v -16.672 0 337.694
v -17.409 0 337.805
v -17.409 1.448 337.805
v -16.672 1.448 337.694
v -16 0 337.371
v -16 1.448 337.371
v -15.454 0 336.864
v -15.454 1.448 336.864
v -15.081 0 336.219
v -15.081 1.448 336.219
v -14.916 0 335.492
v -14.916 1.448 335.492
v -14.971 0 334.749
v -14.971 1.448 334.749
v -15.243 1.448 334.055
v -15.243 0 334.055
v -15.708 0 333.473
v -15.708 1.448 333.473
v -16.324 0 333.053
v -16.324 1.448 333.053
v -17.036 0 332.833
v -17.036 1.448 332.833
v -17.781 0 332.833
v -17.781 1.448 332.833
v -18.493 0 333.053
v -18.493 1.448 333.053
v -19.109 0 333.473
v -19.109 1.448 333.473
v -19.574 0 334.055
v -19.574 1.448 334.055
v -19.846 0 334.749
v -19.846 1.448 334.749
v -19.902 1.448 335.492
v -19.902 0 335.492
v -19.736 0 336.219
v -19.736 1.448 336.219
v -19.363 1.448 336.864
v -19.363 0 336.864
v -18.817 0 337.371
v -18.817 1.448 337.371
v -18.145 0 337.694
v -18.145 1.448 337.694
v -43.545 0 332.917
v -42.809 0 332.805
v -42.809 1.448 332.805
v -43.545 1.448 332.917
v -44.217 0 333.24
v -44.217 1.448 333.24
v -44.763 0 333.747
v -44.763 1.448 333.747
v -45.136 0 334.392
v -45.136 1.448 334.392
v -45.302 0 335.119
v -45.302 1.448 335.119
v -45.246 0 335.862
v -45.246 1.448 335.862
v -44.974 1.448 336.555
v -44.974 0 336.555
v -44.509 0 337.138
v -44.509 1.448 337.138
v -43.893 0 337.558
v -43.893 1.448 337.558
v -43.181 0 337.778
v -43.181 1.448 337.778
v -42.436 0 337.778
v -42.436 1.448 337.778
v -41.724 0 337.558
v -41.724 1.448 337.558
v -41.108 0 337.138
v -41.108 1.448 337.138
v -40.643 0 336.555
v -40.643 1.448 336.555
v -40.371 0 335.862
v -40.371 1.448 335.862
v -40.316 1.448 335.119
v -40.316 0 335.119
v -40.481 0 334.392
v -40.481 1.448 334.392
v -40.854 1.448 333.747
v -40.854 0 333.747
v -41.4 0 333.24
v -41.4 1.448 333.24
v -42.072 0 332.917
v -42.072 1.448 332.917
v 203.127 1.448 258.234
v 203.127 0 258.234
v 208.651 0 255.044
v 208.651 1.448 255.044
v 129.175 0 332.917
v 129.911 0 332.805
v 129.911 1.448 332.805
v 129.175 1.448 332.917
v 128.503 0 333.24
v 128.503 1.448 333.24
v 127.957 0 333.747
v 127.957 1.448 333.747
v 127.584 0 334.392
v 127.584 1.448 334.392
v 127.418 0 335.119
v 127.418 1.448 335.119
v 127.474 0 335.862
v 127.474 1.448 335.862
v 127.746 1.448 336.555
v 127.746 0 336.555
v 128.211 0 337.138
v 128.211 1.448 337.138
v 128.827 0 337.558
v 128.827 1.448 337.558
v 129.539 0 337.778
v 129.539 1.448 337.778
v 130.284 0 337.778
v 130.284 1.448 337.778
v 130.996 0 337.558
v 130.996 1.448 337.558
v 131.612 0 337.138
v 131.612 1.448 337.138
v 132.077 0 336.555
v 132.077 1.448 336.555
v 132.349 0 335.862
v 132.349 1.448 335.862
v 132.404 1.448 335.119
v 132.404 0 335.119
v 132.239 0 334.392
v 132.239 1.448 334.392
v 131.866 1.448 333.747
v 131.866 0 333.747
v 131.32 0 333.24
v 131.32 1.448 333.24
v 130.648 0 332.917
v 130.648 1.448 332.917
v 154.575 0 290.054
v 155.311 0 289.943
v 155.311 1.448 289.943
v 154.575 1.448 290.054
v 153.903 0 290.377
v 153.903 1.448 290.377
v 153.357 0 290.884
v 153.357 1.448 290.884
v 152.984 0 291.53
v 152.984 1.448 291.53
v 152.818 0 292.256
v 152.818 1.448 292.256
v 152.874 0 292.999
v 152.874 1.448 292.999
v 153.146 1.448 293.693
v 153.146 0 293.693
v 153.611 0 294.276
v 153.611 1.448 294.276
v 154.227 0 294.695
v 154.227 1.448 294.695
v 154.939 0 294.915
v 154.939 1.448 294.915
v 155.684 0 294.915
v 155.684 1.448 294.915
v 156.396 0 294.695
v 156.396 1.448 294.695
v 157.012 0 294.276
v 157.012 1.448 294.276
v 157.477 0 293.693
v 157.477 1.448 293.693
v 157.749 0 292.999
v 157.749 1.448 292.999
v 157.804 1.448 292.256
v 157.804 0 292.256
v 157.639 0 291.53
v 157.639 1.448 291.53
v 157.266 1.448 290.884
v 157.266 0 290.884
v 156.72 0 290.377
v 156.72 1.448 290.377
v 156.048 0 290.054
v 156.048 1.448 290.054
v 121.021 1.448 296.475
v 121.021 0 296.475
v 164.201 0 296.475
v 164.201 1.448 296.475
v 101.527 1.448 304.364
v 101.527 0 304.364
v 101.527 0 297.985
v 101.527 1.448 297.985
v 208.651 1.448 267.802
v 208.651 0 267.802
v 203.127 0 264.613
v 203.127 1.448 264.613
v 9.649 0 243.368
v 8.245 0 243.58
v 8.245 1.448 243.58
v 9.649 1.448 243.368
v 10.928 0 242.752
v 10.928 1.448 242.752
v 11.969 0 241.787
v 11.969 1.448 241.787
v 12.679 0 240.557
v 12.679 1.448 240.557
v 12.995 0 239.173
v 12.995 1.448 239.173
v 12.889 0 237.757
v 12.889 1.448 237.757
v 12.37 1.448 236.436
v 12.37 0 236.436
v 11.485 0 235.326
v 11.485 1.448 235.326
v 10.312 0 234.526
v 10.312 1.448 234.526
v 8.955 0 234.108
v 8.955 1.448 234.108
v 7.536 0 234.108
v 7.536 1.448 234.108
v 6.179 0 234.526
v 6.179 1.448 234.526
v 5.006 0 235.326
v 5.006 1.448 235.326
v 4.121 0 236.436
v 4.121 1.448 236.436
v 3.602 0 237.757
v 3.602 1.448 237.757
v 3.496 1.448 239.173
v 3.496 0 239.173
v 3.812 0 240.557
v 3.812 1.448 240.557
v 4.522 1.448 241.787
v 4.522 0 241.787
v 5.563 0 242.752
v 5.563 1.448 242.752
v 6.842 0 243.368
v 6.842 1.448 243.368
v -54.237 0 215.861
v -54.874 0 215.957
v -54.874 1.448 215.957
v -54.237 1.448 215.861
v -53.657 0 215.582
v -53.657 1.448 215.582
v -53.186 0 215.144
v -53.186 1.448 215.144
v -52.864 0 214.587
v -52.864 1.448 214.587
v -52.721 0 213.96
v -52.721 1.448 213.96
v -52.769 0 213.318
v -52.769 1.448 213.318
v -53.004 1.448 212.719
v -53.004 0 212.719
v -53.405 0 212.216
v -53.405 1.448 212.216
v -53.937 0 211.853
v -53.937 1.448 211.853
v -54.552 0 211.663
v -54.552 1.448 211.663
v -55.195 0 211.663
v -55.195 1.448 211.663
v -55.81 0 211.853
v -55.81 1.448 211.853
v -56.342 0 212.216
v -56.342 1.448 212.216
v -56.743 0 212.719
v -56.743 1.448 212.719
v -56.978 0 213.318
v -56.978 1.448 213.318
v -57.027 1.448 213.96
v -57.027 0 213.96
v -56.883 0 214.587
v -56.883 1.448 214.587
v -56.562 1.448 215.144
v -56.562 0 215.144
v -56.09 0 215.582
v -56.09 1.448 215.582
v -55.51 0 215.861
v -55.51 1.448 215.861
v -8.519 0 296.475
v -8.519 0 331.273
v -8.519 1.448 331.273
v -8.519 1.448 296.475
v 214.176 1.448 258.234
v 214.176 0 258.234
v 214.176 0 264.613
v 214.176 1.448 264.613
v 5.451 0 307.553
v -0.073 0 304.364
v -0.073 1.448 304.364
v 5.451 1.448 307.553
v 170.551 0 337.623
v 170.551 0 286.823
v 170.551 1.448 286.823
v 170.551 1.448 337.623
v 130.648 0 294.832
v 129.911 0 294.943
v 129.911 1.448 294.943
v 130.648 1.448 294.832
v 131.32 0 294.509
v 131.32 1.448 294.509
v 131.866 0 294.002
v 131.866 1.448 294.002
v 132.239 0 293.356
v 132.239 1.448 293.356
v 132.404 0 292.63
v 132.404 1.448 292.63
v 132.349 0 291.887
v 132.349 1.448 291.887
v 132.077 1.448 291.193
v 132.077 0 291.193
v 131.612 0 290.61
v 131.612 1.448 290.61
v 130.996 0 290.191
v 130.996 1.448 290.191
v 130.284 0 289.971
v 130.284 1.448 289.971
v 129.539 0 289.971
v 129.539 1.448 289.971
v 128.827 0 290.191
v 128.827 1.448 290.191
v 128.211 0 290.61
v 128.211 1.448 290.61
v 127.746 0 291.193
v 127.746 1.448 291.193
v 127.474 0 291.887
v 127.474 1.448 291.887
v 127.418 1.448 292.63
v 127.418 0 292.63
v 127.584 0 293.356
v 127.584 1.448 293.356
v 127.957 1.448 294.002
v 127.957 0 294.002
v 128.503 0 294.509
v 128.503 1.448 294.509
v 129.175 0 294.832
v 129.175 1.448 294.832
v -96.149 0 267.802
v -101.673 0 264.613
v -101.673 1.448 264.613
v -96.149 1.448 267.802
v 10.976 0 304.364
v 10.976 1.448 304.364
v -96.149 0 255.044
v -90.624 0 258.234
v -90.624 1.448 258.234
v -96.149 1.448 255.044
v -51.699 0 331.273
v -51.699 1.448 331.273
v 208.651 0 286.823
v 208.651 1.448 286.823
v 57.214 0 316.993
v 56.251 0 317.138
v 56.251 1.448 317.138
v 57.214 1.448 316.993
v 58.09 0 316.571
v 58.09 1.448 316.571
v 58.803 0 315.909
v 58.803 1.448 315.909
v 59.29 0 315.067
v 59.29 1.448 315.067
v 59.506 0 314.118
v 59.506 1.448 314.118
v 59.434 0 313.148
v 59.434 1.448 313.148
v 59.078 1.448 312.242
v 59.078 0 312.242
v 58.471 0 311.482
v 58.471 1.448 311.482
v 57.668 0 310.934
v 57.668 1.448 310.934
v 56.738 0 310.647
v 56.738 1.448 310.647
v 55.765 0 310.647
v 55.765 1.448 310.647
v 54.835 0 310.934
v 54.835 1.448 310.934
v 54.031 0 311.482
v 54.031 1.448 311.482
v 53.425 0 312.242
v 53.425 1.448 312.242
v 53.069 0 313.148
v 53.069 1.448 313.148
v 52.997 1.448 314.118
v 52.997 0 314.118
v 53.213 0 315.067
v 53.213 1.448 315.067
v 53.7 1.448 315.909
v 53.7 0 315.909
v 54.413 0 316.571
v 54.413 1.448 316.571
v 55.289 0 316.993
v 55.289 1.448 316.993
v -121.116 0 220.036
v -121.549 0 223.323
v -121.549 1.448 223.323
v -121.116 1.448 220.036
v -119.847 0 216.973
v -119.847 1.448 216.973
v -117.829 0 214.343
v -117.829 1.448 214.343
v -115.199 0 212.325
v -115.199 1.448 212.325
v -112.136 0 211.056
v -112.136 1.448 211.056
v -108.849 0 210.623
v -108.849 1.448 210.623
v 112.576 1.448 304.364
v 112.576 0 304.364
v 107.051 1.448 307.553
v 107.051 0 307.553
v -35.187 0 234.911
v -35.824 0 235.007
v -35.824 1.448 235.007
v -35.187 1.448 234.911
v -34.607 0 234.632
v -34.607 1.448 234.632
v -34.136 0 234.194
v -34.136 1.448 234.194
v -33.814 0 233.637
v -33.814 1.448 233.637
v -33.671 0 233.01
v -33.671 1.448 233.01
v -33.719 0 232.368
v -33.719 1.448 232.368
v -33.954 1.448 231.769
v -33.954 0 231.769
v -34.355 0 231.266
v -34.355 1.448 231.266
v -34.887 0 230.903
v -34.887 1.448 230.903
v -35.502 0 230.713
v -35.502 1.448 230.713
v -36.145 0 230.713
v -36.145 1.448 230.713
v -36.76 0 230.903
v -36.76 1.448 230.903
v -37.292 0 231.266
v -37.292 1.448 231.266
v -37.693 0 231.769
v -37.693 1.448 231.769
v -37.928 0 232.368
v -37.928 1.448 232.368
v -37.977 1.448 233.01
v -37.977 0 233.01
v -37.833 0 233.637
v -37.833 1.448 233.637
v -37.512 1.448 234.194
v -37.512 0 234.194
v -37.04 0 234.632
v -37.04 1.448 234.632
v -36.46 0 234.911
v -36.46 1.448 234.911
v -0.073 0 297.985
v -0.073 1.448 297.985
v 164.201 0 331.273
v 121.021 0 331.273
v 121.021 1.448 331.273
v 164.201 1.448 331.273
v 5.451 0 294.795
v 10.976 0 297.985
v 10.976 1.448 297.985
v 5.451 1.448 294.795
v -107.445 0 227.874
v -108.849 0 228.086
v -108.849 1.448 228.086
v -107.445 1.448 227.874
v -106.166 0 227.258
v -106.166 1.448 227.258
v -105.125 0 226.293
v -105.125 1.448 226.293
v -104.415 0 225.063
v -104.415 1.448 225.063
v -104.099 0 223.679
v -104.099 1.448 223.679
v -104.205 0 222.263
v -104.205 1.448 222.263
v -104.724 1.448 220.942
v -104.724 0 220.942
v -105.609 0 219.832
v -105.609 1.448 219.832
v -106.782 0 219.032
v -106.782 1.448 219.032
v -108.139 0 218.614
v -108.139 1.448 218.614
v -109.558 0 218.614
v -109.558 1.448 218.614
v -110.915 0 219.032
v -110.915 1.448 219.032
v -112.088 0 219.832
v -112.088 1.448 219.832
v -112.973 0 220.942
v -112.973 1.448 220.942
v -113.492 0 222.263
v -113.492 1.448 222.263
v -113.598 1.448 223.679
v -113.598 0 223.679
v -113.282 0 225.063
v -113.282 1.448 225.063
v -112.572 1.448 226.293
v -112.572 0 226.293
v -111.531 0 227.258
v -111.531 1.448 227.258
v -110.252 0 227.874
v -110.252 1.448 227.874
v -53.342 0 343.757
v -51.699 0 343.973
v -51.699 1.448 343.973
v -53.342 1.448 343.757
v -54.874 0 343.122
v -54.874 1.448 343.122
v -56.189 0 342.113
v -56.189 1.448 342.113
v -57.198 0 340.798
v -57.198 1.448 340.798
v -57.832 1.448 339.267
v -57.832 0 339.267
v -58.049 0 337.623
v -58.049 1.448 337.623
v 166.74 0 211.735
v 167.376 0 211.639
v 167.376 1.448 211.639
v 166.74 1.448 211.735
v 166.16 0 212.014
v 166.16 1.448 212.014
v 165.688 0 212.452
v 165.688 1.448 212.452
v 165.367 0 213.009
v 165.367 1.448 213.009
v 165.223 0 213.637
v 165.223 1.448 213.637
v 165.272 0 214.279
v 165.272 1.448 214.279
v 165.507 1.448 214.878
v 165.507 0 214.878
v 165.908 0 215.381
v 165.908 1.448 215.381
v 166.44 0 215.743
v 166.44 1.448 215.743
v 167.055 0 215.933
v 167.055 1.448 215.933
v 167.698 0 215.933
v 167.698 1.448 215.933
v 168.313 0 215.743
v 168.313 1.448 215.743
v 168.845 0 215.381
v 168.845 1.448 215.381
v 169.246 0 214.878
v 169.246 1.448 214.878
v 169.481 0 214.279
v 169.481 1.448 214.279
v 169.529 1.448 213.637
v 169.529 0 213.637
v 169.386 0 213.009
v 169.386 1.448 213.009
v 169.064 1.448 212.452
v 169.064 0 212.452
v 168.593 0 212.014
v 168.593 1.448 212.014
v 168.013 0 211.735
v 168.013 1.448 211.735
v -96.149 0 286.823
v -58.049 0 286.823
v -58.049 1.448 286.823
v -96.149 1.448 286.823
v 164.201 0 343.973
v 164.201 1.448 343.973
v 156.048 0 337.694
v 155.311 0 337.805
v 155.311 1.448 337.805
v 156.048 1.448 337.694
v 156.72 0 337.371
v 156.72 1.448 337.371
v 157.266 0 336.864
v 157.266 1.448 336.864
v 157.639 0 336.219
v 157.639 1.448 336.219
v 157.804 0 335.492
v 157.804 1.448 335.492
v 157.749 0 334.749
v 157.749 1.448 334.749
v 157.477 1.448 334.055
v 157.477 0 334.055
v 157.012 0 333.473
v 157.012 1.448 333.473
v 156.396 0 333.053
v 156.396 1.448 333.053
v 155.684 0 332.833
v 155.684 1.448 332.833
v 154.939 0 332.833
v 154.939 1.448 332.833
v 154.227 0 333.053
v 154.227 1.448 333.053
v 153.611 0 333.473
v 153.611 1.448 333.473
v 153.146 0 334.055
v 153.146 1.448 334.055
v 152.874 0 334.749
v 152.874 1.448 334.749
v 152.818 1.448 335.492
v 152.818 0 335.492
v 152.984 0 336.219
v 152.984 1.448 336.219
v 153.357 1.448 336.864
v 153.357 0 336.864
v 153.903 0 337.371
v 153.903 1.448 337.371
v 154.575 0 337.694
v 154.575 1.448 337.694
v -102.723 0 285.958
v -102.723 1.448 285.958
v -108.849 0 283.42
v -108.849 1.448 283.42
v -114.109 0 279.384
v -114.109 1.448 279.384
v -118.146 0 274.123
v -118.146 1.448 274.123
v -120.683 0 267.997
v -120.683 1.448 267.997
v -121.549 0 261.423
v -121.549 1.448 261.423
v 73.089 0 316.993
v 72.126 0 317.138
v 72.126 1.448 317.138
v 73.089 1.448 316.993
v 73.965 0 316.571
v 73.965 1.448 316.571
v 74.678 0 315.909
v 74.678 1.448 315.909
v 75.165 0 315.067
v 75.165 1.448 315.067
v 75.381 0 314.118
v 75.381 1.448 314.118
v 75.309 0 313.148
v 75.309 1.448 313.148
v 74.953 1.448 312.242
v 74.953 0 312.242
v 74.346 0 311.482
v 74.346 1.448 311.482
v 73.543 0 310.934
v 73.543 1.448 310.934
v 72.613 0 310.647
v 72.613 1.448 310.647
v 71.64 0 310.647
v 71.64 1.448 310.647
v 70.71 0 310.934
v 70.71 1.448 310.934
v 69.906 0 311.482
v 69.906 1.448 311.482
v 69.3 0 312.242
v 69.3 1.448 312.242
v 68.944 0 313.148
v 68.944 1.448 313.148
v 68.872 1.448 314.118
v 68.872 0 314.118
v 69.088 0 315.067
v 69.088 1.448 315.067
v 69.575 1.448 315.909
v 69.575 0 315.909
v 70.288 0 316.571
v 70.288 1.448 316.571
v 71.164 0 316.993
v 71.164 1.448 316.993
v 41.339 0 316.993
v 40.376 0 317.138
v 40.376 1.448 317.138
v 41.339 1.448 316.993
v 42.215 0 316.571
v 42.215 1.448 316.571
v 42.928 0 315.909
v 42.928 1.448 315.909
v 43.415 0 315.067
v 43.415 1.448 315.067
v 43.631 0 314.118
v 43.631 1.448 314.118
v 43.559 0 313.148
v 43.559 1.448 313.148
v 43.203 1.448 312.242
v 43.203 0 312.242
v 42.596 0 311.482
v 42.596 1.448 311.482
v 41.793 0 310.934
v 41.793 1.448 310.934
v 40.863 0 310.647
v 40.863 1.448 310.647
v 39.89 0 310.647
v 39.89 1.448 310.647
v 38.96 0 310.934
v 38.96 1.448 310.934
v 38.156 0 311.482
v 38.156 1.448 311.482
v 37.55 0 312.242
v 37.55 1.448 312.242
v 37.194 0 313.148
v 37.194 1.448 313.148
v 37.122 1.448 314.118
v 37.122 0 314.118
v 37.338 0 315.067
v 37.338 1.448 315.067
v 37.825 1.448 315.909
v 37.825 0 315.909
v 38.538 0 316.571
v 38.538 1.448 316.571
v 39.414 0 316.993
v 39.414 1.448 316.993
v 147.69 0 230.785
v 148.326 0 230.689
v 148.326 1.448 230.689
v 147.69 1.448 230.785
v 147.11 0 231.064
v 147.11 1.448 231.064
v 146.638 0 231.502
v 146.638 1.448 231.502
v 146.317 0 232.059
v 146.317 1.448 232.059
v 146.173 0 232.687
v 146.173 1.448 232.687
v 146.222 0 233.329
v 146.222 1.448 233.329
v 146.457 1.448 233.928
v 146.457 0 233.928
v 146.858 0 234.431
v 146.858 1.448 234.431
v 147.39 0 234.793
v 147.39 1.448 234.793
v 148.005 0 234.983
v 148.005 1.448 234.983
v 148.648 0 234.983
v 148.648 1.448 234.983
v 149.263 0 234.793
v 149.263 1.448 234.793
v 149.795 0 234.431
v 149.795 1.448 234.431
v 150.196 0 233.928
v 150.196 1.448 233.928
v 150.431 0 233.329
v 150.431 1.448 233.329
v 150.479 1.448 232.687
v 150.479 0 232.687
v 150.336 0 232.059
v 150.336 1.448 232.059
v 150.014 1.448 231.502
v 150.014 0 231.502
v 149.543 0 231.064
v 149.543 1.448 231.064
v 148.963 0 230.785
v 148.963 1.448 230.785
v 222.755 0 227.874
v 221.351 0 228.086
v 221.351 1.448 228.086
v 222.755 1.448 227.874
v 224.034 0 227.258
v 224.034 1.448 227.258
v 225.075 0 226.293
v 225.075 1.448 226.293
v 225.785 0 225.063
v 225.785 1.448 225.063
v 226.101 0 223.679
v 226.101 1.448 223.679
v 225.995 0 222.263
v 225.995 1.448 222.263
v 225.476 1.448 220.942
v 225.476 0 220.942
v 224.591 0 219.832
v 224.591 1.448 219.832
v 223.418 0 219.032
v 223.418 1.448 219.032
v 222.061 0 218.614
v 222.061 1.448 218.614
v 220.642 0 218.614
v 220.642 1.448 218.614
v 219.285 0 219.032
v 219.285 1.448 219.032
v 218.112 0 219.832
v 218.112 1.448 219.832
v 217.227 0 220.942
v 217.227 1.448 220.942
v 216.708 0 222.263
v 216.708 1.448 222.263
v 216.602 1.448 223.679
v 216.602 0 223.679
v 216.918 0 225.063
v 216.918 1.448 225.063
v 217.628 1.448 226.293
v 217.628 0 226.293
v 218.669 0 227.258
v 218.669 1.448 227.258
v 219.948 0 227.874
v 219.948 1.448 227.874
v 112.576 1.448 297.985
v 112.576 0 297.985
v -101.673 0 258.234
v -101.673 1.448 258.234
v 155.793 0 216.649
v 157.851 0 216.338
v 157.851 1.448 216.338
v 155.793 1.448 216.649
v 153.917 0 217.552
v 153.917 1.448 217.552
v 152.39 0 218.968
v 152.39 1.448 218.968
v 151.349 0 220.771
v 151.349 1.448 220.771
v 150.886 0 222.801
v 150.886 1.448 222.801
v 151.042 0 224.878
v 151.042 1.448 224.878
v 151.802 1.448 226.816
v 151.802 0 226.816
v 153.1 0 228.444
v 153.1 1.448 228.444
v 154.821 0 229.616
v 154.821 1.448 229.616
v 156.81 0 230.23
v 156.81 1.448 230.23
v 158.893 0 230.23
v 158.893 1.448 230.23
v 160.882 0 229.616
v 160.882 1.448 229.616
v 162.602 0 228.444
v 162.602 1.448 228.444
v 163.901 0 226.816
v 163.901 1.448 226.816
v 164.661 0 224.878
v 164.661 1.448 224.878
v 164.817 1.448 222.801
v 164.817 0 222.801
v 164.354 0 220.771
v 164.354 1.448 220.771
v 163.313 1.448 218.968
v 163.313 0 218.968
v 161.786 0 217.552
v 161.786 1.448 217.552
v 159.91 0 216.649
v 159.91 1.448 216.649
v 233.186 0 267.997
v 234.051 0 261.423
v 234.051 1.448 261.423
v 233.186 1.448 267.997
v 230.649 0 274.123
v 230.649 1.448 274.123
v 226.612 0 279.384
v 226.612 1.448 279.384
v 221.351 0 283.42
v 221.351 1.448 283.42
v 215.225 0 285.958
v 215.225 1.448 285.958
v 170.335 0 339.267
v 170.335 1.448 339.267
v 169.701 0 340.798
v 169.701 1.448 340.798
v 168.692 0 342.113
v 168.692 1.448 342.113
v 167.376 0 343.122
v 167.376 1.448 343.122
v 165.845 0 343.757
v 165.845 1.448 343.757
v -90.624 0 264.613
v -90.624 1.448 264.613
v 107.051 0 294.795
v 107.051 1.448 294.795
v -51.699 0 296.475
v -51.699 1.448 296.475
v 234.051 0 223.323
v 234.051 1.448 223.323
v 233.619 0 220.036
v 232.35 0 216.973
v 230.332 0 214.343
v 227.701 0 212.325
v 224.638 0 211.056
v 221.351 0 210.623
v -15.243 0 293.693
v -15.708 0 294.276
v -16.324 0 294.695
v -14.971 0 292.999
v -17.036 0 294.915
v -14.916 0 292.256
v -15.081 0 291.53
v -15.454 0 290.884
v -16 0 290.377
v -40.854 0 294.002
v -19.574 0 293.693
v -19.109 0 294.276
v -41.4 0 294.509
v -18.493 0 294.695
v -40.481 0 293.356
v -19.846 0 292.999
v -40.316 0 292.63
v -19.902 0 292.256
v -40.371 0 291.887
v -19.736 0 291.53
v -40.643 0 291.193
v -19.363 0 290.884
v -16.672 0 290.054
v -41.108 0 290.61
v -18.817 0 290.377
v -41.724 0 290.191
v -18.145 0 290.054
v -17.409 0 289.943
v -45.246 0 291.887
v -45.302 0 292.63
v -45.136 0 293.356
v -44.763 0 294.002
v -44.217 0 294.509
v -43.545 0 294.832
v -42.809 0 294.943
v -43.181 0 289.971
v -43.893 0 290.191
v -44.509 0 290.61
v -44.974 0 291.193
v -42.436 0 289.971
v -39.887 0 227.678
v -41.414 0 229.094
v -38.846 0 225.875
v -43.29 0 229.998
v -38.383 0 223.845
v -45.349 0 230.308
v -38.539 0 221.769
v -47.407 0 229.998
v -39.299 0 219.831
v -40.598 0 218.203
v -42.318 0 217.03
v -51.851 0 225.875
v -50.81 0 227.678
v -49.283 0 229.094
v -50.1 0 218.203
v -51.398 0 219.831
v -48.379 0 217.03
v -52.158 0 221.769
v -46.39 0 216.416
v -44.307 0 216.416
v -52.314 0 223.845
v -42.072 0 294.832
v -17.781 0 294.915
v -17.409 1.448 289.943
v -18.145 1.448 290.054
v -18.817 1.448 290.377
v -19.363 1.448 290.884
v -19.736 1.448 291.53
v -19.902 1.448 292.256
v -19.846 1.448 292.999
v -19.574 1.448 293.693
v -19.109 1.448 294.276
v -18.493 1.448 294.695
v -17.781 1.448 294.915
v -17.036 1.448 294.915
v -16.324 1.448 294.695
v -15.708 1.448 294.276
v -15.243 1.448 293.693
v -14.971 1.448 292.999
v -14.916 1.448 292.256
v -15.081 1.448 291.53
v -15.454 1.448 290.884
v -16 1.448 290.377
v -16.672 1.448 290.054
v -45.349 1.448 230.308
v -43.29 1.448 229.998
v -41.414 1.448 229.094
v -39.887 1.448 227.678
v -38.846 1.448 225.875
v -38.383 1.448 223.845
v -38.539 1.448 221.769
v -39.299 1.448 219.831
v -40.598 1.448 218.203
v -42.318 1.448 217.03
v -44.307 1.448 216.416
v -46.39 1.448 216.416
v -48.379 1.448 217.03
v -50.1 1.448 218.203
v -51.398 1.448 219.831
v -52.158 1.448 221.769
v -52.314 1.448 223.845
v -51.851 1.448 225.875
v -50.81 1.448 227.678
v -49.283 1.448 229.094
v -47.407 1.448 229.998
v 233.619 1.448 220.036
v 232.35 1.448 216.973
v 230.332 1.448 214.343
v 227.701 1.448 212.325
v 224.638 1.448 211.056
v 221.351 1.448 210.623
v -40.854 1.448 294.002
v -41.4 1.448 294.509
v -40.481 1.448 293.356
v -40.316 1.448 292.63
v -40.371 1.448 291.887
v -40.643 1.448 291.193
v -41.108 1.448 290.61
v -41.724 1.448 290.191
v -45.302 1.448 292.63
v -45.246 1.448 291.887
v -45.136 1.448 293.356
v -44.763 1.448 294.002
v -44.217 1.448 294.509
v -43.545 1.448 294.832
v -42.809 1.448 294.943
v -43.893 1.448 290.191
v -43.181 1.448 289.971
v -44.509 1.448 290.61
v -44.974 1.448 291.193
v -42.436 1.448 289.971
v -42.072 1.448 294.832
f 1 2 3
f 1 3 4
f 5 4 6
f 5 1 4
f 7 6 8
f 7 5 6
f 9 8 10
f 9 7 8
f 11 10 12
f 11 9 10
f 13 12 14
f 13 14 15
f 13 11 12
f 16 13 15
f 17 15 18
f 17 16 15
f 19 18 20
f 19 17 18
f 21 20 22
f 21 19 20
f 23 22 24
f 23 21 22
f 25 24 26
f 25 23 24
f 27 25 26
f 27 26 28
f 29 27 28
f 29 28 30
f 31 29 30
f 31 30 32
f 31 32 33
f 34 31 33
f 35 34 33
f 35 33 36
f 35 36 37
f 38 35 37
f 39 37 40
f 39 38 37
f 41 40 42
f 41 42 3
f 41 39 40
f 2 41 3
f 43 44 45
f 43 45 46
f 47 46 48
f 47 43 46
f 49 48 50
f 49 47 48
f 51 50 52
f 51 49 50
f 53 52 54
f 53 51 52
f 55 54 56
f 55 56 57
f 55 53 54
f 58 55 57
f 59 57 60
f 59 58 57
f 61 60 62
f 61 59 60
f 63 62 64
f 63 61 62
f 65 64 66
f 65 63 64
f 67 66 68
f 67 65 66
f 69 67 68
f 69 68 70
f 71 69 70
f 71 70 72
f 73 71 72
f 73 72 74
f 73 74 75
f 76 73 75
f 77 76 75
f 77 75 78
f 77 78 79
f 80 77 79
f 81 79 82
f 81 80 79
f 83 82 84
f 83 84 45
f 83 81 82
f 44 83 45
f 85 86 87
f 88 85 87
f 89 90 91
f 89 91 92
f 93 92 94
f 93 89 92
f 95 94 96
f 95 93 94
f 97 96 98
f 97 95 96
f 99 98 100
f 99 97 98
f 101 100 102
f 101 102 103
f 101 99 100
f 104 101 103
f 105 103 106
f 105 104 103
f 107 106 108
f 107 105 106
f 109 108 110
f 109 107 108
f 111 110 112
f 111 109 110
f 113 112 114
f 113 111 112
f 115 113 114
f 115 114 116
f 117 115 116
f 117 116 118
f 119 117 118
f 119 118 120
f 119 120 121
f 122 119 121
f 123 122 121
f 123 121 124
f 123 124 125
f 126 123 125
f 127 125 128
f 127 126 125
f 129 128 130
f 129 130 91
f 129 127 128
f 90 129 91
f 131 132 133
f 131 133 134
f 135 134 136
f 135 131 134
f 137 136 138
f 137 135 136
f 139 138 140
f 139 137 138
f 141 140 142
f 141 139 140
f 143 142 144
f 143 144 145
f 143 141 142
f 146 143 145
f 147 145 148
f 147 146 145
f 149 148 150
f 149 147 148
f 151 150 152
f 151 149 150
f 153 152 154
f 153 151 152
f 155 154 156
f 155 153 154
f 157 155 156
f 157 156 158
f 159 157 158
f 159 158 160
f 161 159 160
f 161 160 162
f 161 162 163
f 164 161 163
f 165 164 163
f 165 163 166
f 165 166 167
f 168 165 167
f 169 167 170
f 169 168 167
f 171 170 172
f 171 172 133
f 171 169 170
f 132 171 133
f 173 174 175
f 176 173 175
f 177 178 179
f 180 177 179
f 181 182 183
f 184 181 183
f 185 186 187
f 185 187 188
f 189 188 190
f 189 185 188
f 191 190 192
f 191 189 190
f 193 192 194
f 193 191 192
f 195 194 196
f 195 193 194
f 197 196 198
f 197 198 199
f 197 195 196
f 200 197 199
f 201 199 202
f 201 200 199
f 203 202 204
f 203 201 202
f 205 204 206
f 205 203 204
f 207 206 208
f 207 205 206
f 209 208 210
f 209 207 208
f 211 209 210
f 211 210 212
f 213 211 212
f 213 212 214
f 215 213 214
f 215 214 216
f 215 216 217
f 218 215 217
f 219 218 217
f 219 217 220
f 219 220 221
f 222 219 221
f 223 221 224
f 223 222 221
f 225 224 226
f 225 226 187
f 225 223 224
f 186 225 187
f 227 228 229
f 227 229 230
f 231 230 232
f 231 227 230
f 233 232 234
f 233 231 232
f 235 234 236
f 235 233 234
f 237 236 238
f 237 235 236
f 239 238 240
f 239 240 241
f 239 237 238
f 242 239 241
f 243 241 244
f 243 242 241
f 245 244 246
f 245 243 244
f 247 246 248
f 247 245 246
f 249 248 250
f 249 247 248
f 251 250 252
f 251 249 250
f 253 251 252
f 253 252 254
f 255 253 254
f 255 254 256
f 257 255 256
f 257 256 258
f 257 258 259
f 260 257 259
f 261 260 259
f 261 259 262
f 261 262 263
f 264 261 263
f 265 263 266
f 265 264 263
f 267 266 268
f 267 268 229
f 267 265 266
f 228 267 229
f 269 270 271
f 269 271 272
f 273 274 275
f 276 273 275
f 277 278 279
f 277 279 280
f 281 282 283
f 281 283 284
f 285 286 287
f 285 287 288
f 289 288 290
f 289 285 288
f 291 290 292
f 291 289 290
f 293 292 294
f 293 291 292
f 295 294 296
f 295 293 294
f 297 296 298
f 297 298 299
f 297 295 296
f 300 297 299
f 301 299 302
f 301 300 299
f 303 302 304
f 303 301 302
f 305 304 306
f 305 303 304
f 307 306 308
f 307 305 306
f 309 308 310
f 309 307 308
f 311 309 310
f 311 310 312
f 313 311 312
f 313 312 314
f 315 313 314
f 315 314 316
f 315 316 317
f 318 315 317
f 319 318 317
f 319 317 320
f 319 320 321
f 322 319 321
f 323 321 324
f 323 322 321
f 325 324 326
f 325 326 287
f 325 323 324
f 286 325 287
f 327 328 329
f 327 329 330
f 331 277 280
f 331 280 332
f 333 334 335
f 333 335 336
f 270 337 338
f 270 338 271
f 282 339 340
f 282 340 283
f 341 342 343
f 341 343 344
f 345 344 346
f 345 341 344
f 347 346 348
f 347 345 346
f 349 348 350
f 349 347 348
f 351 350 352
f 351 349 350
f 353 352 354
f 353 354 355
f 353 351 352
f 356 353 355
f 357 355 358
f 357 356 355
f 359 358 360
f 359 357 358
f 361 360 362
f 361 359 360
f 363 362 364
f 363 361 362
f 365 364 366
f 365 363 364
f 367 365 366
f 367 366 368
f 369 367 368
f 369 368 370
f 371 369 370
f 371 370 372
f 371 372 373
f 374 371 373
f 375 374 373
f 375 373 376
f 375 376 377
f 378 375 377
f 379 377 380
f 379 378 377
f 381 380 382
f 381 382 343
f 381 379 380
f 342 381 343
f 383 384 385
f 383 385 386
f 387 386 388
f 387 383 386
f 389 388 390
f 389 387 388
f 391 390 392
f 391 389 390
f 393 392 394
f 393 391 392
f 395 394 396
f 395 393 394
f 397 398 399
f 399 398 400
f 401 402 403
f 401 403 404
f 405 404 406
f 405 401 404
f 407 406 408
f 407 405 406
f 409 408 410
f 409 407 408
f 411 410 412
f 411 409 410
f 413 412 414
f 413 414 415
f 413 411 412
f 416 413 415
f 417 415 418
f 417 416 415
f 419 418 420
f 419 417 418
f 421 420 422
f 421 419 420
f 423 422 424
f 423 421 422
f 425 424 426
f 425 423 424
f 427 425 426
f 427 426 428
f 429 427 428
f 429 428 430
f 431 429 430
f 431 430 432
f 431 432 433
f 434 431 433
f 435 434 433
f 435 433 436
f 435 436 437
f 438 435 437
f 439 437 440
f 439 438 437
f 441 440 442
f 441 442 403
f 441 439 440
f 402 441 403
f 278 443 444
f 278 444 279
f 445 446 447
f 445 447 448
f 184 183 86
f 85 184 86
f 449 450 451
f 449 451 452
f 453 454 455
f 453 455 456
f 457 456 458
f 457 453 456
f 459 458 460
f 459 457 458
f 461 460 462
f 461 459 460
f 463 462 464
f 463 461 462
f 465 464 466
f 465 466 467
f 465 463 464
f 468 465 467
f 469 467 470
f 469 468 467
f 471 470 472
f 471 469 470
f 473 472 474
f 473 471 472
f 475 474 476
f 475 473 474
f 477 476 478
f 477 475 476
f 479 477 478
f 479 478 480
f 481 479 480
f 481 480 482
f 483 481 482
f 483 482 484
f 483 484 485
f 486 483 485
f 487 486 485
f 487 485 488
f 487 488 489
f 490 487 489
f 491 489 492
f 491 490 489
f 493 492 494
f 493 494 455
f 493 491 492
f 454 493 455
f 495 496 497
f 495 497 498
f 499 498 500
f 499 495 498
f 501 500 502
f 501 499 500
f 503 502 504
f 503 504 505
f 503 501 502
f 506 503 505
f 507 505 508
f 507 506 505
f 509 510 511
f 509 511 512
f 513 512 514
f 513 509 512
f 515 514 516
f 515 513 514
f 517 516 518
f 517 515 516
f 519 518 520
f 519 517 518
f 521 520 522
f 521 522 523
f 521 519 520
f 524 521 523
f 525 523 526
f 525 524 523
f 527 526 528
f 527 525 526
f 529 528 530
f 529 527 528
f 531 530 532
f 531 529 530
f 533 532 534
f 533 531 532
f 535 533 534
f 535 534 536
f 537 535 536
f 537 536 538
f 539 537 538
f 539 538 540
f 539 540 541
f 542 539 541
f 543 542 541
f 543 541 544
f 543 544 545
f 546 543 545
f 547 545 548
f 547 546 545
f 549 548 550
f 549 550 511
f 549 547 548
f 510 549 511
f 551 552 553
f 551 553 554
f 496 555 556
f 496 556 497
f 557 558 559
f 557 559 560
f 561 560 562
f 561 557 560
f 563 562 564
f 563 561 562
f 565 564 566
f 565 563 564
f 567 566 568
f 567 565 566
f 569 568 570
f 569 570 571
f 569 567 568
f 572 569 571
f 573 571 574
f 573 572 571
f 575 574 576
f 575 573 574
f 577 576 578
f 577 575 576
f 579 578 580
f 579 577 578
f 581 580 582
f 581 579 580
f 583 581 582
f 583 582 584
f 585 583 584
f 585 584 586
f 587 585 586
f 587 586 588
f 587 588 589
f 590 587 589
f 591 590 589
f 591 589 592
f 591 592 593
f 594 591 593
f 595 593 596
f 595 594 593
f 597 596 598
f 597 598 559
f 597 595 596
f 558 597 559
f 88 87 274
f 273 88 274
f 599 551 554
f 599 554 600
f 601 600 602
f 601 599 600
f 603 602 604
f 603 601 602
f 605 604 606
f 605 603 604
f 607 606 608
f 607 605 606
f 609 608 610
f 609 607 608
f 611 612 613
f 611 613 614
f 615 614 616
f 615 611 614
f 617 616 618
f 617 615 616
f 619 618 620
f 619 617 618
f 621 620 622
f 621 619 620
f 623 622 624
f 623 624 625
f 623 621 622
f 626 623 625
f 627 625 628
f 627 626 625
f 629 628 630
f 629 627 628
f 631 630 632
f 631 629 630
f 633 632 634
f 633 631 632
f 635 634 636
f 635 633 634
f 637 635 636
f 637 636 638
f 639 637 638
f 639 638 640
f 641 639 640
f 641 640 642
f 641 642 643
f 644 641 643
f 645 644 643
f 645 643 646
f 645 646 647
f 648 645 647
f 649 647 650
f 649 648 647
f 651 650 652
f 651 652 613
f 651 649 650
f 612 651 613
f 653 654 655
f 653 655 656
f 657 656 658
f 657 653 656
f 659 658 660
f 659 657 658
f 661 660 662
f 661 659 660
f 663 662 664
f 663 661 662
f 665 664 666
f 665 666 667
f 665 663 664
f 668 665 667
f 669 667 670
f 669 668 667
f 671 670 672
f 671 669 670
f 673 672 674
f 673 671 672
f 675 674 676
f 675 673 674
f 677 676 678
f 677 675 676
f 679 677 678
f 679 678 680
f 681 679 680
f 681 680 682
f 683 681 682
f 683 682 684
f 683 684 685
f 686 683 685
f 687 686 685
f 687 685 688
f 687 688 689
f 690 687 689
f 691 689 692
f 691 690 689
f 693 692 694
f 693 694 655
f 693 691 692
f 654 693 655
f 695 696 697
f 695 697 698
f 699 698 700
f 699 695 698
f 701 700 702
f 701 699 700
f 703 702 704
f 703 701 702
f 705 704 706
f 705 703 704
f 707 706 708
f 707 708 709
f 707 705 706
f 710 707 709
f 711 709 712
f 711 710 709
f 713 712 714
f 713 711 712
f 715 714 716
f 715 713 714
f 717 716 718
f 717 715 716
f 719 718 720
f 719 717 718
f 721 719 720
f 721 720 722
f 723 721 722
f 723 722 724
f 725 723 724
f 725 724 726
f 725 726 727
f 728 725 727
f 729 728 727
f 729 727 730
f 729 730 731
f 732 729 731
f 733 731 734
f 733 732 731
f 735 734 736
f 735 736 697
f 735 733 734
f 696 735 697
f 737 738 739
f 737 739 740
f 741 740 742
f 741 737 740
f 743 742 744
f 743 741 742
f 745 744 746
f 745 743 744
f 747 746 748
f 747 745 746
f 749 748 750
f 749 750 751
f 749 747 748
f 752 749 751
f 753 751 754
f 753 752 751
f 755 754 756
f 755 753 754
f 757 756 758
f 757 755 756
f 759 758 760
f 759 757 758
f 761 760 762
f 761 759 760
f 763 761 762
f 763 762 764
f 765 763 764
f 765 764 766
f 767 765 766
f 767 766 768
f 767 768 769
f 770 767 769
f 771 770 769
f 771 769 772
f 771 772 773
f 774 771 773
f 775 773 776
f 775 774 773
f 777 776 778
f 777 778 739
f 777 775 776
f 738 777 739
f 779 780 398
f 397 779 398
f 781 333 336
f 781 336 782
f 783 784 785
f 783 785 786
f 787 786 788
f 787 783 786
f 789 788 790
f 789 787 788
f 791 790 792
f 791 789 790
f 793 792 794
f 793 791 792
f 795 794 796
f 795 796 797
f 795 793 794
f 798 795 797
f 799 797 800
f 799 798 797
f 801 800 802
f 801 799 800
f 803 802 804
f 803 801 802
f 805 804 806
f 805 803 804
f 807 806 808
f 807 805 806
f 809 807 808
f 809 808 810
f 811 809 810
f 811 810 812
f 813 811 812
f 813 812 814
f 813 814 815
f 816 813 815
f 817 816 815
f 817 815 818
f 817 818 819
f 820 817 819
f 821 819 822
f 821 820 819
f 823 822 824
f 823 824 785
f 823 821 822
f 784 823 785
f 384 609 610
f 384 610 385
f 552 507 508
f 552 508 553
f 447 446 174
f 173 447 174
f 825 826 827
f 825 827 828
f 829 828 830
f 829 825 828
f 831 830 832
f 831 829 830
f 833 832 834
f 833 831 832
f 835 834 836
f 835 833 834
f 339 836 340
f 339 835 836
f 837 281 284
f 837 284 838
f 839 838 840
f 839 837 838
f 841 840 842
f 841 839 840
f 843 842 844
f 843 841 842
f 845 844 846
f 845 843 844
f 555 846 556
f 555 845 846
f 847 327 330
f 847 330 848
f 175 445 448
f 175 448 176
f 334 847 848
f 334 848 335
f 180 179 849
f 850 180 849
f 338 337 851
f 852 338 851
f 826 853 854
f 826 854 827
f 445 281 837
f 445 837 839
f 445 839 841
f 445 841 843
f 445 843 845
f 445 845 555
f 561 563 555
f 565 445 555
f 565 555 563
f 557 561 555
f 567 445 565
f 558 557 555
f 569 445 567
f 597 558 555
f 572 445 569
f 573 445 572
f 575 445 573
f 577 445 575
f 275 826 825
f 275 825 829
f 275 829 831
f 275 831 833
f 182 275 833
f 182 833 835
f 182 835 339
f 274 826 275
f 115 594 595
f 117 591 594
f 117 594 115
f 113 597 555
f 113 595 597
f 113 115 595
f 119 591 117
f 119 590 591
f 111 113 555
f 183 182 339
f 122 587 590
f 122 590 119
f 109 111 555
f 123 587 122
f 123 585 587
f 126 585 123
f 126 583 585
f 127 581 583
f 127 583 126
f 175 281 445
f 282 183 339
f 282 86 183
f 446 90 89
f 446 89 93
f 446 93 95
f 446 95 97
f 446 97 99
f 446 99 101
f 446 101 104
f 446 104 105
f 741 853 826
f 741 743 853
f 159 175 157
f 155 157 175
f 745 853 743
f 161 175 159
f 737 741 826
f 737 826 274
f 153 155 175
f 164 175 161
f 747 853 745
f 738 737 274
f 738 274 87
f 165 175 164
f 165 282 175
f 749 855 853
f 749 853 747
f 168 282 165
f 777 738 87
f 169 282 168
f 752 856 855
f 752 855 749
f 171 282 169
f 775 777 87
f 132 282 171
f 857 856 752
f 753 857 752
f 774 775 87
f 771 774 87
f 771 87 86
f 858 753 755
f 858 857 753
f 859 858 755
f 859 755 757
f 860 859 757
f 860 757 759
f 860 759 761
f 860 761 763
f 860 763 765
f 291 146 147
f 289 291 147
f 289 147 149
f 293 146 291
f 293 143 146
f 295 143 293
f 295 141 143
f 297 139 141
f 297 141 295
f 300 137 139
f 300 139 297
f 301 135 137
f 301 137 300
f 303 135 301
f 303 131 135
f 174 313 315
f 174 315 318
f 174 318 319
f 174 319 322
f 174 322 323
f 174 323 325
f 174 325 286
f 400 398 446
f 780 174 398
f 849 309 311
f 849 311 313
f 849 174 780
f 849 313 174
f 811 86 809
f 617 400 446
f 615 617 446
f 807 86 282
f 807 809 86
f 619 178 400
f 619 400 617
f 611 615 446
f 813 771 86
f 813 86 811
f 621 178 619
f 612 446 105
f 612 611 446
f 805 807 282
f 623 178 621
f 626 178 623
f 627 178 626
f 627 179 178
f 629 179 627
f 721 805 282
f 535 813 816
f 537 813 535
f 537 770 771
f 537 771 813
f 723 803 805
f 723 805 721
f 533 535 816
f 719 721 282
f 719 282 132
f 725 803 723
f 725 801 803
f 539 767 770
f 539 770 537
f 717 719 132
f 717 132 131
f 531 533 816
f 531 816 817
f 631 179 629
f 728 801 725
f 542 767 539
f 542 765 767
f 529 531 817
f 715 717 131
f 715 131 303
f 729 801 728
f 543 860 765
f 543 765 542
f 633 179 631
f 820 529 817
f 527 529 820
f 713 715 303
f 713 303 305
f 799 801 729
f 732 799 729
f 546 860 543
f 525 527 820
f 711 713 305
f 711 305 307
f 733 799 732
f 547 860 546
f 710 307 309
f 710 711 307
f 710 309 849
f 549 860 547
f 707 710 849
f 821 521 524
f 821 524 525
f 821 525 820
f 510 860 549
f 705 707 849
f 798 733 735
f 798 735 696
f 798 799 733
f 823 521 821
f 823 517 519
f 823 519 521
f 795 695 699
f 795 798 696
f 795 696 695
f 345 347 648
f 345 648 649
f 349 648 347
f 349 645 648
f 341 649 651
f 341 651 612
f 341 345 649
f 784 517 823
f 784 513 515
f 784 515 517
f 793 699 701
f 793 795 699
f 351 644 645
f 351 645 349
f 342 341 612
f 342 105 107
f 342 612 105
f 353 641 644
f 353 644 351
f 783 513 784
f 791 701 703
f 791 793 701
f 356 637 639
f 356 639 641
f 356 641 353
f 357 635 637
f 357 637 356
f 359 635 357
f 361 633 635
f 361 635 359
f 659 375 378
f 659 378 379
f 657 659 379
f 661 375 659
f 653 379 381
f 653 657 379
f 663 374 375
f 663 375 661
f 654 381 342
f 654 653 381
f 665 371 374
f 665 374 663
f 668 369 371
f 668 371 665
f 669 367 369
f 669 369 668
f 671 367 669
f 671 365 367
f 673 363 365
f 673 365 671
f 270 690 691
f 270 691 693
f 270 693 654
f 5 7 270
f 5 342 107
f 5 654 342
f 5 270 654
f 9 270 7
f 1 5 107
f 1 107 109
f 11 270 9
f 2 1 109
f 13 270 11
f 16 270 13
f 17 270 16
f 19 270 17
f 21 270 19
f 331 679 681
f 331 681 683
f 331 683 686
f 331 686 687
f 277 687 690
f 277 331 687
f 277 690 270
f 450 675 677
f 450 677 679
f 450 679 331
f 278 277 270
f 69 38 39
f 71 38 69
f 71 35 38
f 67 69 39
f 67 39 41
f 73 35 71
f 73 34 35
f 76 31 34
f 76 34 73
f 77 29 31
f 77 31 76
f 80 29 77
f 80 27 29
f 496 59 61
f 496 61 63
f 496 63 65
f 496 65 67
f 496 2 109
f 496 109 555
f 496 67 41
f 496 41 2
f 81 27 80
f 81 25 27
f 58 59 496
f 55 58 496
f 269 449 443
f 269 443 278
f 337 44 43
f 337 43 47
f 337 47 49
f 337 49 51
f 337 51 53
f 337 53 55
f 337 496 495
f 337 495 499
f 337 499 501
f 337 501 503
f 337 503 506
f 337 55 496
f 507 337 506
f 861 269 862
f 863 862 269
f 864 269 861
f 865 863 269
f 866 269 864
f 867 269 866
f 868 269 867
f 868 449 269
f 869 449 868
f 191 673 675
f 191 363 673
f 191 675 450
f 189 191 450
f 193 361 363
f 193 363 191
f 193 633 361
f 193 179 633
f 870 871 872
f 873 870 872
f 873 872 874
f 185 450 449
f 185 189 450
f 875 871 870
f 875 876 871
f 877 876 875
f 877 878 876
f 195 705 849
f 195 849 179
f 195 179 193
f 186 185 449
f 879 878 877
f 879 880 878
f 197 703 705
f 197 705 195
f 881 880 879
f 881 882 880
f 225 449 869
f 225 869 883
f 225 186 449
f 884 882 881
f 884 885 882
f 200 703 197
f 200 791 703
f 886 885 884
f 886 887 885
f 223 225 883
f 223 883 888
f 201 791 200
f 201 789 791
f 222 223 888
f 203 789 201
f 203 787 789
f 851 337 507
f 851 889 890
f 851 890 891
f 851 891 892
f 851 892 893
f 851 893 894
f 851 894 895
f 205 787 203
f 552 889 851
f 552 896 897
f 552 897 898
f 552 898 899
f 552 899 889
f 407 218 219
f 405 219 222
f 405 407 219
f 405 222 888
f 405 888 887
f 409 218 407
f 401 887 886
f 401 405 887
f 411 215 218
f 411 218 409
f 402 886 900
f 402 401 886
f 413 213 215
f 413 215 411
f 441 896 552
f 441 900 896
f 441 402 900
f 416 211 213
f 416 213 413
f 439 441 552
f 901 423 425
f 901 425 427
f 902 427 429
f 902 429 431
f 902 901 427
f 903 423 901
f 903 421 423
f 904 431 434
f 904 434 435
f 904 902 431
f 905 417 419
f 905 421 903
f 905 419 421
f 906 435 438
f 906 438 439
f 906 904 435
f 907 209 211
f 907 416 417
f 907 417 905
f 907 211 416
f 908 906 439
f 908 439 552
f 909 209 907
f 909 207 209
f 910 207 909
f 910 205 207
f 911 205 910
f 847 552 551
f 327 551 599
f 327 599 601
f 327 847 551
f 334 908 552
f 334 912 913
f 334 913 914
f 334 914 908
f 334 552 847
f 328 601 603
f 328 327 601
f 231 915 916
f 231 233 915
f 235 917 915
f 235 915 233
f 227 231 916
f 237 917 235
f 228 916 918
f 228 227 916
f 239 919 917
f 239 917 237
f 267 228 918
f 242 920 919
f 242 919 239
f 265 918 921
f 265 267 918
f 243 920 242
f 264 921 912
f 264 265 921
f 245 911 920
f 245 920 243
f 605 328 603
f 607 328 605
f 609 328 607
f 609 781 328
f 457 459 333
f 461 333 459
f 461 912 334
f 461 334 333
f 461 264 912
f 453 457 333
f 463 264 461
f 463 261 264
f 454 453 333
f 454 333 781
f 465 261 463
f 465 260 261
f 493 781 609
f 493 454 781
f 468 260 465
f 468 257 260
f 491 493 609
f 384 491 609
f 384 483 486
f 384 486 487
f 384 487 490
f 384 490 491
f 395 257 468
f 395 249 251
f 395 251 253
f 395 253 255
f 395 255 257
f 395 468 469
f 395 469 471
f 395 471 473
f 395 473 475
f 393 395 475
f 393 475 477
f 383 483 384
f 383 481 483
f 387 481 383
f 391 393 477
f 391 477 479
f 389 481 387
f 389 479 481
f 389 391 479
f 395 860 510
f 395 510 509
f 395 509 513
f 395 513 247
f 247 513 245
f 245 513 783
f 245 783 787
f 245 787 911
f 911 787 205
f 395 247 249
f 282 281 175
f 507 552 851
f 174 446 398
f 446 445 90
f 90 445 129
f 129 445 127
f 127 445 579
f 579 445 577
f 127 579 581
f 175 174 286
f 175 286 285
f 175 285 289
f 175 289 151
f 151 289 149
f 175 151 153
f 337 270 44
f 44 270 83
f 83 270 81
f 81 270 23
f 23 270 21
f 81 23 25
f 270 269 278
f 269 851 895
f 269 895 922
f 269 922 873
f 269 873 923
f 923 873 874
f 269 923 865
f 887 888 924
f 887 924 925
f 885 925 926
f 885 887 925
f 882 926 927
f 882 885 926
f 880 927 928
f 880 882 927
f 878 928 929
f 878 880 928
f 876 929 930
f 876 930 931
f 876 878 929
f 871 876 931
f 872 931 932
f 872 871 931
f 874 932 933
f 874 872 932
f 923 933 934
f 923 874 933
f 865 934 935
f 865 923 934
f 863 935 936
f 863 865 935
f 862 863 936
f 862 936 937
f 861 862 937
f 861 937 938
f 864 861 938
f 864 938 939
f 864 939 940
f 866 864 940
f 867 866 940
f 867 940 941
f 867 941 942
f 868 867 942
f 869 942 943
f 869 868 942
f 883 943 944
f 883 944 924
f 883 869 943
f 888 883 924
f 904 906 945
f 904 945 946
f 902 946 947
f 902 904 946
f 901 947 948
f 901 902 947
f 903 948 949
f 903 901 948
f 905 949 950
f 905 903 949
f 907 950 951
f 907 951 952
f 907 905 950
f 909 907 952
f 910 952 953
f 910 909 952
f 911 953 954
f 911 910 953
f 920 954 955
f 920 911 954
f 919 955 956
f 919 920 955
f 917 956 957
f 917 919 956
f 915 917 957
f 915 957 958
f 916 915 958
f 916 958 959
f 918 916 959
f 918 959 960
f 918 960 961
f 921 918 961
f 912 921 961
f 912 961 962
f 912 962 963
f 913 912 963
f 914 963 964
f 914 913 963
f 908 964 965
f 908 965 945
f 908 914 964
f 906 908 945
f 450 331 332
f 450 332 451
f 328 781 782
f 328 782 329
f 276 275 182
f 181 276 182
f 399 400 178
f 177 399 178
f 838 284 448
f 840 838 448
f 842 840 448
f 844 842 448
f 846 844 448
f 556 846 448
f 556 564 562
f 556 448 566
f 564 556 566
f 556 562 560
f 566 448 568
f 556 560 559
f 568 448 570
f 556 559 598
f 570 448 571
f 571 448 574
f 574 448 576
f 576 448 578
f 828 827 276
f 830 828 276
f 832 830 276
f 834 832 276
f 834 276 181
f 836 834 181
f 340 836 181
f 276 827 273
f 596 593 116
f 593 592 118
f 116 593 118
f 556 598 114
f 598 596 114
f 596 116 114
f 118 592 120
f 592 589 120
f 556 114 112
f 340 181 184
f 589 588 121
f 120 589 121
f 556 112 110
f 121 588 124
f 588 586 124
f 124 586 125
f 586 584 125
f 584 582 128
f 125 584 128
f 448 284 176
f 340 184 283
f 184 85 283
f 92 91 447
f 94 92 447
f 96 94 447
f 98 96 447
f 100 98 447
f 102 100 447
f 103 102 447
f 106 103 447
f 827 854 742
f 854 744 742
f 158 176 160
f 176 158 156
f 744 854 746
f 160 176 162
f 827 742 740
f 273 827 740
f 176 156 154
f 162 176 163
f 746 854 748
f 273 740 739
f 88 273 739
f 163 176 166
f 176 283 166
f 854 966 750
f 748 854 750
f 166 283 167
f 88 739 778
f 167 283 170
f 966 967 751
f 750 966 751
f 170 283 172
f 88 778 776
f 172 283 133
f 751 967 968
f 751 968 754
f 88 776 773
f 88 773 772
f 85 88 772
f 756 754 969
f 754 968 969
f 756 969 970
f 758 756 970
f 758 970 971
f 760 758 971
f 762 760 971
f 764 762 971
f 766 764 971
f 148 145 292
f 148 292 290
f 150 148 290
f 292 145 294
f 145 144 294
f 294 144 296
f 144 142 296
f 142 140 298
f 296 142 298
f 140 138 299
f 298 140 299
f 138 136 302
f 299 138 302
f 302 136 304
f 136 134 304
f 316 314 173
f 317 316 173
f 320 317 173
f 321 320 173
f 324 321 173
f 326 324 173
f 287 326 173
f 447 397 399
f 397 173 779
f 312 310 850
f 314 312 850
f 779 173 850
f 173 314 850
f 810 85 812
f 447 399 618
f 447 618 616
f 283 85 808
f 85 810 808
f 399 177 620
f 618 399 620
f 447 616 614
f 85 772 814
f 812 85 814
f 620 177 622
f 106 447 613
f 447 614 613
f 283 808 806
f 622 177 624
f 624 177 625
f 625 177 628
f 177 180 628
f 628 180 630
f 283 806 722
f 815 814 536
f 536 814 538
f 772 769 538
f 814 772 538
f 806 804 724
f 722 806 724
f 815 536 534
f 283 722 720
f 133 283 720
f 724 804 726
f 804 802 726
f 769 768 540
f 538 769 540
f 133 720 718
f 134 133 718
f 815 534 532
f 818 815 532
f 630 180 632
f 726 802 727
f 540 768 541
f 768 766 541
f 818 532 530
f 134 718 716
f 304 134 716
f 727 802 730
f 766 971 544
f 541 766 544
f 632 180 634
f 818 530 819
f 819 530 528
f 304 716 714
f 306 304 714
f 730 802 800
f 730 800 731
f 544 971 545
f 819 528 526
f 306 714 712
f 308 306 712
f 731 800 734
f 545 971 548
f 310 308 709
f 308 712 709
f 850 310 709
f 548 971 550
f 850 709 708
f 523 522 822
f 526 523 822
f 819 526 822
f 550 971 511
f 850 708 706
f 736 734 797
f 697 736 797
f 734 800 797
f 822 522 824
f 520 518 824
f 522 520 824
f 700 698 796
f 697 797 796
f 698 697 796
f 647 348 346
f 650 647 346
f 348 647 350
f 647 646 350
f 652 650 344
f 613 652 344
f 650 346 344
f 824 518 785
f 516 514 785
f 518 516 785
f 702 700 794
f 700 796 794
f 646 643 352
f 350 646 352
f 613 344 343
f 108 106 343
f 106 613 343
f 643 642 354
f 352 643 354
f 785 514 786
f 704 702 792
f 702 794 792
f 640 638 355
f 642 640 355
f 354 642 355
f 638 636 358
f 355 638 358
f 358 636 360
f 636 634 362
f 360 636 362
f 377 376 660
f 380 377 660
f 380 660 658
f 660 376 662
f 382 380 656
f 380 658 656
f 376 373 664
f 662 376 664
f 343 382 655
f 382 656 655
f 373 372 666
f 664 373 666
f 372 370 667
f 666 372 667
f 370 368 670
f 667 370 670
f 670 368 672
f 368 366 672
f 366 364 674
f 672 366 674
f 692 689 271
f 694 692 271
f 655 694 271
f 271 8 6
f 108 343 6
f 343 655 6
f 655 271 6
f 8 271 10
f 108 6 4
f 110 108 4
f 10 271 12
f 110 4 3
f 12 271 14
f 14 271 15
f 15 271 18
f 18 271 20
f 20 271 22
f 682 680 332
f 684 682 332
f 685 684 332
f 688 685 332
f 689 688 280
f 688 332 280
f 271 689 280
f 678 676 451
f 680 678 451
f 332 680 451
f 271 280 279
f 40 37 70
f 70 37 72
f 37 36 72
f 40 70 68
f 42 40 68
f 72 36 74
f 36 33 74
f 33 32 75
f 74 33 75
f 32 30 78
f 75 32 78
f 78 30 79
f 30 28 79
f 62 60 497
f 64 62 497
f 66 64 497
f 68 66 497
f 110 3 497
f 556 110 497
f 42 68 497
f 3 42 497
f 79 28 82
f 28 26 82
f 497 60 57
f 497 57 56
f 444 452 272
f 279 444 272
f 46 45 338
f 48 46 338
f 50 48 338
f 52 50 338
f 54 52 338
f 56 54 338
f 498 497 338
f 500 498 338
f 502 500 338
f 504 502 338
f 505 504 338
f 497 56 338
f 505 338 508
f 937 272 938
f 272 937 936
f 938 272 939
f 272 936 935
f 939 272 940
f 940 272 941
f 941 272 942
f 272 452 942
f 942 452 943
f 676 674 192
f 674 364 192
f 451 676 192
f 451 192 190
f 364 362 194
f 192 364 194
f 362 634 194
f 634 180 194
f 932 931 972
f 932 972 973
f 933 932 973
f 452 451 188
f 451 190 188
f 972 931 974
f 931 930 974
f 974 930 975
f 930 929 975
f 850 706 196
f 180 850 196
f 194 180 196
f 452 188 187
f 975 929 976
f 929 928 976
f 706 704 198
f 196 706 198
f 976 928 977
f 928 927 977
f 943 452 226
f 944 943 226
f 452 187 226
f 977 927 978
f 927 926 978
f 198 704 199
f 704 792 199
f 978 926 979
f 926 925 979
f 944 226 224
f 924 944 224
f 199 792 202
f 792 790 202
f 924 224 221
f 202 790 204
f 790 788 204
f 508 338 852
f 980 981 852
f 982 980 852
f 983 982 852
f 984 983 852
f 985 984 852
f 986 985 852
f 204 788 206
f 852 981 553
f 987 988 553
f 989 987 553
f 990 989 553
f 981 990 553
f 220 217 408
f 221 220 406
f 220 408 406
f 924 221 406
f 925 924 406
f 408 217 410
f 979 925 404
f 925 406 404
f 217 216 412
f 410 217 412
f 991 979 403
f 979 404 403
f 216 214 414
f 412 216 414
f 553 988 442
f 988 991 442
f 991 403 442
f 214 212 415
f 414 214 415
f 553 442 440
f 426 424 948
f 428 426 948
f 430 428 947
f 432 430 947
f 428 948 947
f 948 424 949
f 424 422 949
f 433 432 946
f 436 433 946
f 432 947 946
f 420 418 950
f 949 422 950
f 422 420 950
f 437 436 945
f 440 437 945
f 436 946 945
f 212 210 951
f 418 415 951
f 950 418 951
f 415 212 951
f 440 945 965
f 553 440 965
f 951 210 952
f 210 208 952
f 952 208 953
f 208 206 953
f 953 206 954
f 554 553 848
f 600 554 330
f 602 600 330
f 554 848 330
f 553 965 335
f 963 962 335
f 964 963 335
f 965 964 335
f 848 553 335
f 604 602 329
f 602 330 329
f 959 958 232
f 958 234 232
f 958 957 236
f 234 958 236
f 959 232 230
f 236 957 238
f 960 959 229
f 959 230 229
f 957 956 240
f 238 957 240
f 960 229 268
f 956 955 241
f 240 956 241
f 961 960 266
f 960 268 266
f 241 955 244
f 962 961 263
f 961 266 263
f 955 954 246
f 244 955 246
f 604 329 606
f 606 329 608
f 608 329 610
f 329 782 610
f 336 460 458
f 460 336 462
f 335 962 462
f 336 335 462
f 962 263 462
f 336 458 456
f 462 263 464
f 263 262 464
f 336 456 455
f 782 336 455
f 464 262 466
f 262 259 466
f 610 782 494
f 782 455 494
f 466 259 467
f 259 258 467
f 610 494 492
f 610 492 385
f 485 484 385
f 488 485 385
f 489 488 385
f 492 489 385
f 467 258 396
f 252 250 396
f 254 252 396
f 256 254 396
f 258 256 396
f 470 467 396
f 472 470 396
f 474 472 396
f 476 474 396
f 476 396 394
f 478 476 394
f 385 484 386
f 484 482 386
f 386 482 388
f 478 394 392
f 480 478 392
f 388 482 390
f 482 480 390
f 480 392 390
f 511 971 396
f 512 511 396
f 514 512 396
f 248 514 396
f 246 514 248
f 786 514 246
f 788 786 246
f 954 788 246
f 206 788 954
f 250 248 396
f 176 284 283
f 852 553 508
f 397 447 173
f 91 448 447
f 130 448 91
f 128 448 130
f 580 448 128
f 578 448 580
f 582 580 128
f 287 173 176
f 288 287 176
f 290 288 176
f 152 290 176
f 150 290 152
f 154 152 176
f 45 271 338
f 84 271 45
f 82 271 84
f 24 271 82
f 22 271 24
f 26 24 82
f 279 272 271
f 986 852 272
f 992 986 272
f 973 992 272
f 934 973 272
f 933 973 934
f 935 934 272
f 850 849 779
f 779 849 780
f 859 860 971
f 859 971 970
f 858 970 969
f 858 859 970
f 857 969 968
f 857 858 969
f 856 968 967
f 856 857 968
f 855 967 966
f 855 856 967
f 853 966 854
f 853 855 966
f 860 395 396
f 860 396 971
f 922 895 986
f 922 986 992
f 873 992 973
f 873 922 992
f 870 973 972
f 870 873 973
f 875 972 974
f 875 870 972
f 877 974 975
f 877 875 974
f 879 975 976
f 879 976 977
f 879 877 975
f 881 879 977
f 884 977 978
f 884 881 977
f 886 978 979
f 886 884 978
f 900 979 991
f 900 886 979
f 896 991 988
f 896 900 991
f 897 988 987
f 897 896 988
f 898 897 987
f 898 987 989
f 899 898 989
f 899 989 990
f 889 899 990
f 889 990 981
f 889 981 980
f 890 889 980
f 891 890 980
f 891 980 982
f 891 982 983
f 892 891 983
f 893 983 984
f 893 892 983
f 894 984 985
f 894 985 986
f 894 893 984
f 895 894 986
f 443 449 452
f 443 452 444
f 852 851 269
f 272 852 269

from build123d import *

# Parameters (mm, degrees)
SKETCH1_R           = 2.5
SKETCH1_R_2         = 3.2639
SKETCH1_R_3         = 6.985
SKETCH1_R_4         = 2.159
SKETCH1_R_5         = 4.7625
SKETCH1_W           = 43.18
SKETCH1_H           = 34.798
BOSS_EXTRUDE1_DEPTH = 1.4478


with BuildPart() as part:
    # Sketch1 → Boss-Extrude1 (new body)
    with BuildSketch(Plane(origin=(0, 0, 0), x_dir=(1, 0, 0), z_dir=(0, 1, 0))):
        with BuildLine():
            Line((-58.048540962, -286.823205678), (-96.148540962, -286.823205678))
            ThreePointArc((-96.148540962, -286.823205678), (-114.109053204, -279.38371792), (-121.548540962, -261.423205678))
            Line((-121.548540962, -261.423205678), (-121.548540962, -223.323205678))
            ThreePointArc((-121.548540962, -223.323205678), (-117.828797083, -214.342949557), (-108.848540962, -210.623205678))
            Line((-108.848540962, -210.623205678), (221.351459038, -210.623205678))
            ThreePointArc((221.351459038, -210.623205678), (230.331715159, -214.342949557), (234.051459038, -223.323205678))
            Line((234.051459038, -223.323205678), (234.051459038, -261.423205678))
            ThreePointArc((234.051459038, -261.423205678), (226.611971281, -279.38371792), (208.651459038, -286.823205678))
            Line((208.651459038, -286.823205678), (170.551459038, -286.823205678))
            Line((170.551459038, -286.823205678), (170.551459038, -337.623205678))
            ThreePointArc((170.551459038, -337.623205678), (168.691587099, -342.113333738), (164.201459038, -343.973205678))
            Line((164.201459038, -343.973205678), (-51.698540962, -343.973205678))
            ThreePointArc((-51.698540962, -343.973205678), (-56.188669022, -342.113333738), (-58.048540962, -337.623205678))
            Line((-58.048540962, -337.623205678), (-58.048540962, -286.823205678))
        make_face()
        with Locations(Location((-42.808540962, -292.442955678, 0), (0, 0, 270))):
            Circle(SKETCH1_R, mode=Mode.SUBTRACT)
        with Locations(Location((-17.408540962, -292.442955678, 0), (0, 0, 90))):
            Circle(SKETCH1_R, mode=Mode.SUBTRACT)
        with Locations(Location((-17.408540962, -335.305455678, 0), (0, 0, 270))):
            Circle(SKETCH1_R, mode=Mode.SUBTRACT)
        with Locations(Location((-42.808540962, -335.305455678, 0), (0, 0, 90))):
            Circle(SKETCH1_R, mode=Mode.SUBTRACT)
        with Locations(Location((129.911459038, -292.442955678, 0), (0, 0, 270))):
            Circle(SKETCH1_R, mode=Mode.SUBTRACT)
        with Locations(Location((155.311459038, -292.442955678, 0), (0, 0, 90))):
            Circle(SKETCH1_R, mode=Mode.SUBTRACT)
        with Locations(Location((155.311459038, -335.305455678, 0), (0, 0, 270))):
            Circle(SKETCH1_R, mode=Mode.SUBTRACT)
        with Locations(Location((129.911459038, -335.305455678, 0), (0, 0, 90))):
            Circle(SKETCH1_R, mode=Mode.SUBTRACT)
        with Locations(Location((40.376459038, -313.874205678, 0), (0, 0, 270))):
            Circle(SKETCH1_R_2, mode=Mode.SUBTRACT)
        with Locations(Location((56.251459038, -313.874205678, 0), (0, 0, 270))):
            Circle(SKETCH1_R_2, mode=Mode.SUBTRACT)
        with Locations(Location((72.126459038, -313.874205678, 0), (0, 0, 270))):
            Circle(SKETCH1_R_2, mode=Mode.SUBTRACT)
        with Locations(Location((-45.348540962, -223.323205678, 0), (0, 0, 270))):
            Circle(SKETCH1_R_3, mode=Mode.SUBTRACT)
        with Locations(Location((-54.873540962, -213.798205678, 0), (0, 0, 270))):
            Circle(SKETCH1_R_4, mode=Mode.SUBTRACT)
        with Locations(Location((-35.823540962, -232.848205678, 0), (0, 0, 270))):
            Circle(SKETCH1_R_4, mode=Mode.SUBTRACT)
        with Locations(Location((8.245459038, -238.817205678, 0), (0, 0, 270))):
            Circle(SKETCH1_R_5, mode=Mode.SUBTRACT)
        with Locations(Location((148.326459038, -232.848205678, 0), (0, 0, 90))):
            Circle(SKETCH1_R_4, mode=Mode.SUBTRACT)
        with Locations(Location((157.851459038, -223.323205678, 0), (0, 0, 90))):
            Circle(SKETCH1_R_3, mode=Mode.SUBTRACT)
        with Locations(Location((167.376459038, -213.798205678, 0), (0, 0, 90))):
            Circle(SKETCH1_R_4, mode=Mode.SUBTRACT)
        with Locations(Location((-108.848540962, -223.323205678, 0), (0, 0, 270))):
            Circle(SKETCH1_R_5, mode=Mode.SUBTRACT)
        with Locations(Location((221.351459038, -223.323205678, 0), (0, 0, 270))):
            Circle(SKETCH1_R_5, mode=Mode.SUBTRACT)
        with Locations((-30.108540962, -313.874205678)):
            Rectangle(SKETCH1_W, SKETCH1_H, mode=Mode.SUBTRACT)
        with Locations((142.611459038, -313.874205678)):
            Rectangle(SKETCH1_W, SKETCH1_H, mode=Mode.SUBTRACT)
        Polygon((10.975959038, -304.36377724), (10.975959038, -297.984634115), (5.451459038, -294.795062553), (-0.073040962, -297.984634115), (-0.073040962, -304.36377724), (5.451459038, -307.553348802), align=None, mode=Mode.SUBTRACT)
        Polygon((107.051459038, -307.553348802), (101.526959038, -304.36377724), (101.526959038, -297.984634115), (107.051459038, -294.795062553), (112.575959038, -297.984634115), (112.575959038, -304.36377724), align=None, mode=Mode.SUBTRACT)
        Polygon((-90.624040962, -258.233634115), (-96.148540962, -255.044062553), (-101.673040962, -258.233634115), (-101.673040962, -264.61277724), (-96.148540962, -267.802348802), (-90.624040962, -264.61277724), align=None, mode=Mode.SUBTRACT)
        Polygon((214.175959038, -264.61277724), (208.651459038, -267.802348802), (203.126959038, -264.61277724), (203.126959038, -258.233634115), (208.651459038, -255.044062553), (214.175959038, -258.233634115), align=None, mode=Mode.SUBTRACT)
    extrude(amount=BOSS_EXTRUDE1_DEPTH)


solid = part.part
